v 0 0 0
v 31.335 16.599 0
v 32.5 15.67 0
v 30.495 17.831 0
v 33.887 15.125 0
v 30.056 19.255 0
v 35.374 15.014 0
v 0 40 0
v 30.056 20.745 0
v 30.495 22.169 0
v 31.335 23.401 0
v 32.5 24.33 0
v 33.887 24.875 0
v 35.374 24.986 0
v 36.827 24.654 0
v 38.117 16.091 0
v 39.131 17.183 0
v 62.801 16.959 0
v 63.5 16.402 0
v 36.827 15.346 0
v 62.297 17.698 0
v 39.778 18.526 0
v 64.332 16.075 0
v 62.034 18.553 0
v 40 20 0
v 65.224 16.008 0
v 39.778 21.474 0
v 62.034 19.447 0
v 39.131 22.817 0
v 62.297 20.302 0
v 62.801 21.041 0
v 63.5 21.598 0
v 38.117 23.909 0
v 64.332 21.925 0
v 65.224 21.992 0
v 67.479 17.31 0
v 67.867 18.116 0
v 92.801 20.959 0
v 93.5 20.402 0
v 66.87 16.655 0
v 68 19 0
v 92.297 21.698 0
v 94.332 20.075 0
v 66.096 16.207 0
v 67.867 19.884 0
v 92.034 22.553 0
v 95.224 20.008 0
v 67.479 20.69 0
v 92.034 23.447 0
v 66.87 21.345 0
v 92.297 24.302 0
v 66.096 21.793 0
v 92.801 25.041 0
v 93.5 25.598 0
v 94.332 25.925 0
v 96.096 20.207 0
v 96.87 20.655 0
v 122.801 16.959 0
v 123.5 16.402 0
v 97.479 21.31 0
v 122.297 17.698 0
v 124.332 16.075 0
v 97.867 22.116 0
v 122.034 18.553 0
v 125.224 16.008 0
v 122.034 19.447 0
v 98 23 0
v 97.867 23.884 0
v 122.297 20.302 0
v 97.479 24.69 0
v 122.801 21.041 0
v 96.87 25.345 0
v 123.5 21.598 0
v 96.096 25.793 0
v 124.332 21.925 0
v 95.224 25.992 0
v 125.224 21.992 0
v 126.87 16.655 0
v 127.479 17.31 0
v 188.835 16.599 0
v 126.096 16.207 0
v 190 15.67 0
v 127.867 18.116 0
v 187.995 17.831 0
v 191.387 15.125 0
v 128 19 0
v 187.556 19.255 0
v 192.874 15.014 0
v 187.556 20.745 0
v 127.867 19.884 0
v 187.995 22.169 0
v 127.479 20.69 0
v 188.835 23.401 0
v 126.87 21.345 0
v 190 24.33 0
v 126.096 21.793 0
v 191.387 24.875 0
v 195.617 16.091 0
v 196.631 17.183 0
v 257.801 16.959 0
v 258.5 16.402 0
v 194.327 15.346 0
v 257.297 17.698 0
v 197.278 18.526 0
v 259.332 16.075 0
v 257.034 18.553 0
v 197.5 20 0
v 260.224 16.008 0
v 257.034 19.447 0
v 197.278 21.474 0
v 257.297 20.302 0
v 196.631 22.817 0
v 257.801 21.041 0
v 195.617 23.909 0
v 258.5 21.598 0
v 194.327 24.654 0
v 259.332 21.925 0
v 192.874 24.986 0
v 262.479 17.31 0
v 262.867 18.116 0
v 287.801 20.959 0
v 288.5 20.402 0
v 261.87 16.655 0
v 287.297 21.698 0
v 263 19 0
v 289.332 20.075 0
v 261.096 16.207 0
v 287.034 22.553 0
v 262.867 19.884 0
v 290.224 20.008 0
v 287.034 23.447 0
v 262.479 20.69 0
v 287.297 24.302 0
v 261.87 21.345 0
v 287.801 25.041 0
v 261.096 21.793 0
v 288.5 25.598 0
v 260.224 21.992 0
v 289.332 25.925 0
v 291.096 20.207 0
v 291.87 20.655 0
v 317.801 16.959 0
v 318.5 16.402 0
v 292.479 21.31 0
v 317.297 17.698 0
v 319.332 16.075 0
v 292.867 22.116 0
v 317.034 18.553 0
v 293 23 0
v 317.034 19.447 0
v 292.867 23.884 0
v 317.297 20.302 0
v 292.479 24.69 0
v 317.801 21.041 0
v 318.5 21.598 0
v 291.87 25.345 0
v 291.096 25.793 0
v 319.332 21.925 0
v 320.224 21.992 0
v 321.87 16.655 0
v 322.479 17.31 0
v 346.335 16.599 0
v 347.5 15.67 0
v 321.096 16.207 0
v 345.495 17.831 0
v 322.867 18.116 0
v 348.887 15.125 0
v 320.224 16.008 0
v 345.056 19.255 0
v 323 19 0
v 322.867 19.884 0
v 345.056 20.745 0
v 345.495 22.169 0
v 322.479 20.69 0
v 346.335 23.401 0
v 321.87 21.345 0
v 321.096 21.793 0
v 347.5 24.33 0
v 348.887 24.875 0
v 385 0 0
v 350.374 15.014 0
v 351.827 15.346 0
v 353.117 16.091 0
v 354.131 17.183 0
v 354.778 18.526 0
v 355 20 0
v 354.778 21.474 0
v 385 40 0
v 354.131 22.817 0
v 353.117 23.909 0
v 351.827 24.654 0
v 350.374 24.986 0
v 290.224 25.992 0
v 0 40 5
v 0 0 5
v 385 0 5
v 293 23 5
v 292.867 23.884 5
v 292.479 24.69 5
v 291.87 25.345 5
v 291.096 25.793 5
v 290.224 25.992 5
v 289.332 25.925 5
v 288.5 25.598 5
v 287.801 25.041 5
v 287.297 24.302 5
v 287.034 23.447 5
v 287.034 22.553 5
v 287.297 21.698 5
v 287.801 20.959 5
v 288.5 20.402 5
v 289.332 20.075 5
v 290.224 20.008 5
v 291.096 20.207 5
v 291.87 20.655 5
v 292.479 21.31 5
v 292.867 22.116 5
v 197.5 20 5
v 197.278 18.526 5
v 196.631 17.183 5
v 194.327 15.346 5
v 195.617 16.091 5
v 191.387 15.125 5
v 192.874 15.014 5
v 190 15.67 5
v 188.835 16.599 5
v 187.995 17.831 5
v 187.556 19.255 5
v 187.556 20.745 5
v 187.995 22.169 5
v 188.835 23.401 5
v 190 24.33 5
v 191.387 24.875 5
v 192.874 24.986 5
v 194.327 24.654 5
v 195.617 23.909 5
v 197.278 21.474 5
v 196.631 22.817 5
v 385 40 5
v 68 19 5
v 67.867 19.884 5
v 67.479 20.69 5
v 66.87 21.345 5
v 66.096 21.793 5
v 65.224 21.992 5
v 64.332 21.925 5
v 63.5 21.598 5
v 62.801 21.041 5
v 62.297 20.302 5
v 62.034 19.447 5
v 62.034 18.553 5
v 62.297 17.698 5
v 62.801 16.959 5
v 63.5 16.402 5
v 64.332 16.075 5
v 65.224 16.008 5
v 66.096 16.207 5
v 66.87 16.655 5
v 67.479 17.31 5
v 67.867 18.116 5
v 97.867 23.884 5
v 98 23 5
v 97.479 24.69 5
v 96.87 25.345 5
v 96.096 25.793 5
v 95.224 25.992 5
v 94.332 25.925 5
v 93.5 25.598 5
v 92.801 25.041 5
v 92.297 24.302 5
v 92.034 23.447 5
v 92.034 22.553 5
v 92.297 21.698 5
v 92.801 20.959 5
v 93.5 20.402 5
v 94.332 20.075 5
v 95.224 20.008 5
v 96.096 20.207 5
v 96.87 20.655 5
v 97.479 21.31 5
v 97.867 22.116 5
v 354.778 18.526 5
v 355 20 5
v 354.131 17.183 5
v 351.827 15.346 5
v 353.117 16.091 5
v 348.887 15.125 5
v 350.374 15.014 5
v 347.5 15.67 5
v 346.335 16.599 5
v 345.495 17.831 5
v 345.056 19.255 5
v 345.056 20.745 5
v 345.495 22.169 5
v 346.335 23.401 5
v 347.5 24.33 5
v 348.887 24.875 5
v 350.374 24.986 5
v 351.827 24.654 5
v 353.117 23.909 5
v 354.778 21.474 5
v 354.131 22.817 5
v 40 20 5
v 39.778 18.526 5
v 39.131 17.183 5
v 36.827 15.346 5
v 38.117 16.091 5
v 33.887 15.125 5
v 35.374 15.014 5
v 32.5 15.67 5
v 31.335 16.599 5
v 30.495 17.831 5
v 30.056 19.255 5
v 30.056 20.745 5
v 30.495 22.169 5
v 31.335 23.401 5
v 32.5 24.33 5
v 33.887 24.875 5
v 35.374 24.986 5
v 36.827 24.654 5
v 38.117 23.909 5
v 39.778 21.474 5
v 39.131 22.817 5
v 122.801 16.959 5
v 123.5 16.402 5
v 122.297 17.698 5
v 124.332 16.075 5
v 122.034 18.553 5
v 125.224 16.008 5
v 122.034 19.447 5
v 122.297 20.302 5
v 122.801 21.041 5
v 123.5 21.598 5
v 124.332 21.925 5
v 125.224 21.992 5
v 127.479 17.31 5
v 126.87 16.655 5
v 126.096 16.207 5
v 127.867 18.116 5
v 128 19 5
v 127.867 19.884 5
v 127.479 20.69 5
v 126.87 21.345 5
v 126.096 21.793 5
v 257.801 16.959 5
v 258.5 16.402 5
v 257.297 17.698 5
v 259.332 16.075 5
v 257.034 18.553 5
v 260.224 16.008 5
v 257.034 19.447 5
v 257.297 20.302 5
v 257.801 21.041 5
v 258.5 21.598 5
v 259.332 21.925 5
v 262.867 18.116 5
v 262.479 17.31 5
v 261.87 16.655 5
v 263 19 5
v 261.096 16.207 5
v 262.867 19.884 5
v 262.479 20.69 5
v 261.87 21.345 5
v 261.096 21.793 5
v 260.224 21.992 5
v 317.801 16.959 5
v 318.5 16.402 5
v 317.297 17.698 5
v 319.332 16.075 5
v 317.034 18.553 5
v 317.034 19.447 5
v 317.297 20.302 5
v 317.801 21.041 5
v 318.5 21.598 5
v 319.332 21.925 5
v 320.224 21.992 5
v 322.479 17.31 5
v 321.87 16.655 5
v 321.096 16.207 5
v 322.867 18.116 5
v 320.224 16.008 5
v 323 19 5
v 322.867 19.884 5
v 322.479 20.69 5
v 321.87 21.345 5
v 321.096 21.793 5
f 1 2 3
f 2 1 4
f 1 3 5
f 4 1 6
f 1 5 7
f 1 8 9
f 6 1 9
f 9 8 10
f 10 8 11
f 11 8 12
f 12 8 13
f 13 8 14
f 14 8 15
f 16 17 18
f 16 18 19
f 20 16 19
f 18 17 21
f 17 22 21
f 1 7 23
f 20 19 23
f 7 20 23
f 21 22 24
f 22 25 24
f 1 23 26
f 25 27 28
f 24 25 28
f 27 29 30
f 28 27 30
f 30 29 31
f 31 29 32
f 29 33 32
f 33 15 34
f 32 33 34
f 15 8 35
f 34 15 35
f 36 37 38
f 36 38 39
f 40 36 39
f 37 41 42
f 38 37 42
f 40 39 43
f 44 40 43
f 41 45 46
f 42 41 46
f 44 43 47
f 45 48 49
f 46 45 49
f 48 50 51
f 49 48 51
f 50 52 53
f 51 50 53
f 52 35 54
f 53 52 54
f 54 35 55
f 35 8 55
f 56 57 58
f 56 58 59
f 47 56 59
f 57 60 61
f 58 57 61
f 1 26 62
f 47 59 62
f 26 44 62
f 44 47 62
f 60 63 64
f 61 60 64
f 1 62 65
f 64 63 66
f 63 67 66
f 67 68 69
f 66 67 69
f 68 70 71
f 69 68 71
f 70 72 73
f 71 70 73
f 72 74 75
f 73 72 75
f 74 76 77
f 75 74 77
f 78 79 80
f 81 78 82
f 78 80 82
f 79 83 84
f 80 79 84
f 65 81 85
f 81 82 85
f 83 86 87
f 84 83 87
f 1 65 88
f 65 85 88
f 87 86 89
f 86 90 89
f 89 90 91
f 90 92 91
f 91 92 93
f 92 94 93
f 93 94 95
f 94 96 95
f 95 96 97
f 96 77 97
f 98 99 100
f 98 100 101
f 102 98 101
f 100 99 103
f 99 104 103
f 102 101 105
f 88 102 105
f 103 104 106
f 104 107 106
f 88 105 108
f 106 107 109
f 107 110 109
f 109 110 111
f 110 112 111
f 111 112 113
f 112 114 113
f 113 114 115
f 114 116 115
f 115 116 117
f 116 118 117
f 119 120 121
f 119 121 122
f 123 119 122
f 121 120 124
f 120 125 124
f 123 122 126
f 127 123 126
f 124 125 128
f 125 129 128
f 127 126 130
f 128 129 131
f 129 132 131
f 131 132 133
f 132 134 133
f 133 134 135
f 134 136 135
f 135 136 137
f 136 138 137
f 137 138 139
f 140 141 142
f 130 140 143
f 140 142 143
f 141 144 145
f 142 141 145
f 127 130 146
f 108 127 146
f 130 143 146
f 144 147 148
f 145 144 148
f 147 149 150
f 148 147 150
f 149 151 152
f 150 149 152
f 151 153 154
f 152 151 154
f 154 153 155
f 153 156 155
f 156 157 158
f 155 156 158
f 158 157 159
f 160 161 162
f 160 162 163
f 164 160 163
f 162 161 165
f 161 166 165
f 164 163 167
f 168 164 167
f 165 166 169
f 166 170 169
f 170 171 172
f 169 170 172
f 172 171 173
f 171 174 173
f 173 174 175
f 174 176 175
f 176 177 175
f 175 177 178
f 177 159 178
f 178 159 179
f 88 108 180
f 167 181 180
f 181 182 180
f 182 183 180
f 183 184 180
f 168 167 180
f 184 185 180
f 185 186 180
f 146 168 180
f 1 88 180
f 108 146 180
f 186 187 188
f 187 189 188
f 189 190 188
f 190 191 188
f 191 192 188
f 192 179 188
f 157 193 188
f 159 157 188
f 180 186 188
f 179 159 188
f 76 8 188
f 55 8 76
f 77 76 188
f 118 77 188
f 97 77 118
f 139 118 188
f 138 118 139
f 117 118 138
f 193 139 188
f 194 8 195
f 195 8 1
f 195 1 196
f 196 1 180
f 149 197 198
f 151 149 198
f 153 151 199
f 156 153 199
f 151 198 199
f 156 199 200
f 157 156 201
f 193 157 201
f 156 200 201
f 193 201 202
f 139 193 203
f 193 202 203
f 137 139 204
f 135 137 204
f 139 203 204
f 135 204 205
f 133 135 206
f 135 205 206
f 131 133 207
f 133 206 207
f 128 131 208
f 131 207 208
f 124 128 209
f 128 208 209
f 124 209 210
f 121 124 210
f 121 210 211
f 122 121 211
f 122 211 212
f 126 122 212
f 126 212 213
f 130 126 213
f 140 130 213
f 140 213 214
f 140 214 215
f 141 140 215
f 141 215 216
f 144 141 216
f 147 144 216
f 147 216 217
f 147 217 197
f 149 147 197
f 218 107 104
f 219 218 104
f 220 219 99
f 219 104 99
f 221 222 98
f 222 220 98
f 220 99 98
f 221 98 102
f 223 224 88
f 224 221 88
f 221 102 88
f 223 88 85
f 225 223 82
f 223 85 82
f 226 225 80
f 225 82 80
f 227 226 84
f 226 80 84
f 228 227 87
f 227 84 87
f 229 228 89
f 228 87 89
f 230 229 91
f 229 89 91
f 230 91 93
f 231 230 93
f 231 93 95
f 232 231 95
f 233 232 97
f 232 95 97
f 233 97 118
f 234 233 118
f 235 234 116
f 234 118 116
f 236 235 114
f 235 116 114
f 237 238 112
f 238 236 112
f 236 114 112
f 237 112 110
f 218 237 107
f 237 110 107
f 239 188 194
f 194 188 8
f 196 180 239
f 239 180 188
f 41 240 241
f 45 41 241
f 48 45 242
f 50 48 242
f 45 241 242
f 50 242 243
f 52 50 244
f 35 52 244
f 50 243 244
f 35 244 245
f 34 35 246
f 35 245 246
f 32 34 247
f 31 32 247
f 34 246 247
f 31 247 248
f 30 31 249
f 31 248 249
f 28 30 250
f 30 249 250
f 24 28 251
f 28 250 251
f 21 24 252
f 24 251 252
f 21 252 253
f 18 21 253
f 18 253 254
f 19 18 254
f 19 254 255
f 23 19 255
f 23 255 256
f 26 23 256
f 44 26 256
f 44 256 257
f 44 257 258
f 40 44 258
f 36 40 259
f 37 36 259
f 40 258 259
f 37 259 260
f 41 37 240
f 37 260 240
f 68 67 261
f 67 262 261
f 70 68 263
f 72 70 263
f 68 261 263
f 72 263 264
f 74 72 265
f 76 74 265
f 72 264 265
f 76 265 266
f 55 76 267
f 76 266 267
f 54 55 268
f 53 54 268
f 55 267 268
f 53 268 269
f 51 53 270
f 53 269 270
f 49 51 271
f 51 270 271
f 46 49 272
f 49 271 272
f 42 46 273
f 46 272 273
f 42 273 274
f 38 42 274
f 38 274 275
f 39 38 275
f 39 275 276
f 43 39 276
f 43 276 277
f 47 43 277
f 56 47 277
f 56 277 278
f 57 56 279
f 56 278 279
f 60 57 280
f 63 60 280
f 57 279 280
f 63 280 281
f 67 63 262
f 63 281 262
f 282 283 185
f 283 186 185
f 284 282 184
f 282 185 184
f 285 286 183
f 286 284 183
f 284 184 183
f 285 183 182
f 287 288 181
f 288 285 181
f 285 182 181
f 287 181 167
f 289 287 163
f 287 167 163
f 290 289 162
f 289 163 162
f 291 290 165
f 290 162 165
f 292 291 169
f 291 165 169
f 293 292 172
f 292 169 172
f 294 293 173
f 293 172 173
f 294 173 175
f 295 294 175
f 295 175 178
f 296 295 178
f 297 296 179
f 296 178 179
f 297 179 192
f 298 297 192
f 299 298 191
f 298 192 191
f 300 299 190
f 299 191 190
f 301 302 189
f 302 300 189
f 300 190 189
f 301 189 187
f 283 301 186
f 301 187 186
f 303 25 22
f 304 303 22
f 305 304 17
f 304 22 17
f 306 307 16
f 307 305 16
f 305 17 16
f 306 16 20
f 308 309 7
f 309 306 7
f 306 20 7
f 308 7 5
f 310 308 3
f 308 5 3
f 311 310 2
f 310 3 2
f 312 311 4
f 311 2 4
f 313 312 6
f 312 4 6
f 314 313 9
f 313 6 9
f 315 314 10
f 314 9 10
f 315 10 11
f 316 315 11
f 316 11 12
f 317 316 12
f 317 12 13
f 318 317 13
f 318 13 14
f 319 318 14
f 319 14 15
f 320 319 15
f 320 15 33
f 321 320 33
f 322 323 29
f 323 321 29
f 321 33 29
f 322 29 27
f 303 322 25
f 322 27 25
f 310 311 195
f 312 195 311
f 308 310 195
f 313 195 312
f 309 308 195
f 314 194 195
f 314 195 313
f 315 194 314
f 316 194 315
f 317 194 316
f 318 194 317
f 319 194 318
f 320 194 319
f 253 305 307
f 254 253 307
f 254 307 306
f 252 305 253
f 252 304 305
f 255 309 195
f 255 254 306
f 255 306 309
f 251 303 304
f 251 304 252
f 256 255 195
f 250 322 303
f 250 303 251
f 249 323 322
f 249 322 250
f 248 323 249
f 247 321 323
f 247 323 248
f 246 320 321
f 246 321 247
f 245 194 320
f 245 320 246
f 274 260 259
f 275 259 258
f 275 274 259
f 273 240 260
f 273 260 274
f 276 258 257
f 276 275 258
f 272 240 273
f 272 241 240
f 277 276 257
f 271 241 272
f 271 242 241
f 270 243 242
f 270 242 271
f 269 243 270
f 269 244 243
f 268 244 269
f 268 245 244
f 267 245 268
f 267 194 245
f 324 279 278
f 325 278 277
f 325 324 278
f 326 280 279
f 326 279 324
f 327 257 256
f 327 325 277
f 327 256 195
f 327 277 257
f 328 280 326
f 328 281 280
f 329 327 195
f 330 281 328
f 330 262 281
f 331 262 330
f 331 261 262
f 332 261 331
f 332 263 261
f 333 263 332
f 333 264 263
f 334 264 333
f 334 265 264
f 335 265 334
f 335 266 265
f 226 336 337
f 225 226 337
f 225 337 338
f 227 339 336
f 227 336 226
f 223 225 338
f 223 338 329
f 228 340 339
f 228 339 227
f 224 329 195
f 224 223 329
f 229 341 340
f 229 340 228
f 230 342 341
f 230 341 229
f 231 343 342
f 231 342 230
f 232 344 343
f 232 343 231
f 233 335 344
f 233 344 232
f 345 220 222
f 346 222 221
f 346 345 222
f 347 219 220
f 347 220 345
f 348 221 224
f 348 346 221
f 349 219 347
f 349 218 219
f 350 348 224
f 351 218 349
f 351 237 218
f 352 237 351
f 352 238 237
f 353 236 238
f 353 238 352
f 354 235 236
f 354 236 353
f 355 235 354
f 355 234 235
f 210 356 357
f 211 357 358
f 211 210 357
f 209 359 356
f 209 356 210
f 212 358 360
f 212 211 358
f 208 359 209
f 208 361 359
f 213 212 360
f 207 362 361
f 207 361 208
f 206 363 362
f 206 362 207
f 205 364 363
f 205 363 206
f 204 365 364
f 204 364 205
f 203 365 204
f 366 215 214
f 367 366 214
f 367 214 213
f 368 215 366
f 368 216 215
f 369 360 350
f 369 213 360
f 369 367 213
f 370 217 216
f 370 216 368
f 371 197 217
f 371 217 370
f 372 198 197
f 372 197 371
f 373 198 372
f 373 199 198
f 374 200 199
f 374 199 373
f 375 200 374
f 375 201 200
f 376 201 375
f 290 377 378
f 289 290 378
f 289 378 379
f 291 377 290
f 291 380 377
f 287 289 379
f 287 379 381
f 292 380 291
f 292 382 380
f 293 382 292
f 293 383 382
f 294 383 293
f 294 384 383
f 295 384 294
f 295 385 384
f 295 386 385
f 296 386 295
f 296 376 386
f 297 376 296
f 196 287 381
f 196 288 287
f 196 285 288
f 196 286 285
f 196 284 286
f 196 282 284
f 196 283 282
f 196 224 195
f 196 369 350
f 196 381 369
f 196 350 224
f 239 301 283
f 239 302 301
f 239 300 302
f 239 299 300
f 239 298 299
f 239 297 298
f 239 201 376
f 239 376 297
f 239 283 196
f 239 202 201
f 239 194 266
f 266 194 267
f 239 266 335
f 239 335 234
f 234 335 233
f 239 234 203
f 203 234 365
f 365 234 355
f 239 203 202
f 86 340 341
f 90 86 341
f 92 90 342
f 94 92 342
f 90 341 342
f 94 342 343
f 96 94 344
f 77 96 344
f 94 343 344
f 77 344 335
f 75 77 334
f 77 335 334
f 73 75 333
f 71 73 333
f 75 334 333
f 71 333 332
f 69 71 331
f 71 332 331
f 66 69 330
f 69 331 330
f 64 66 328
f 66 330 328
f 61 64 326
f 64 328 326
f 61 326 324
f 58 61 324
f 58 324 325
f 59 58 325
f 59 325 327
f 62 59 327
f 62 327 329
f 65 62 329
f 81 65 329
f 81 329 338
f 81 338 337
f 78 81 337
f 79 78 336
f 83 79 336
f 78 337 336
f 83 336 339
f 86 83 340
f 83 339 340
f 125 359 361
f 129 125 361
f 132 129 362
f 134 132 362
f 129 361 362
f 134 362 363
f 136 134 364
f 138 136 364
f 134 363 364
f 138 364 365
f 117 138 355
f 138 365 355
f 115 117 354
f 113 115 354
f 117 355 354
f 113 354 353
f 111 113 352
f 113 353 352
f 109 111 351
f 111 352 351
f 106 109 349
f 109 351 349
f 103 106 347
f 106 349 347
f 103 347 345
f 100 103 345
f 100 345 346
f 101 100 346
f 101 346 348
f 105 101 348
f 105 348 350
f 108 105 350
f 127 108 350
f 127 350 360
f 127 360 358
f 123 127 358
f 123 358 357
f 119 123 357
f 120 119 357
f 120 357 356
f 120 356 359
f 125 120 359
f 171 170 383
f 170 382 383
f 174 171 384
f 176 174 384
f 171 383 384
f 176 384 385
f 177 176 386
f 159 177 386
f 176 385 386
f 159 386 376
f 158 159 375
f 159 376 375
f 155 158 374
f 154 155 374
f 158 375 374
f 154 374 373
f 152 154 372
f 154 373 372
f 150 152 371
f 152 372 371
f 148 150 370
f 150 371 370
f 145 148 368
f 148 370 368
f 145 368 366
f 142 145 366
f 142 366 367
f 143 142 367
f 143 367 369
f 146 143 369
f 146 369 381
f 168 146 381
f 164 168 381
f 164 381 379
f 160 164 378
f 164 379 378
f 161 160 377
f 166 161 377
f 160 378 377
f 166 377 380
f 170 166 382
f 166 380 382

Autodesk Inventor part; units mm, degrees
ref_plane "YZ Plane" through (0, 0, 0) normal (1, 0, 0) x (0, 1, 0)
ref_plane "XZ Plane" through (0, 0, 0) normal (0, 1, 0) x (-1, 0, 0)
ref_plane "XY Plane" through (0, 0, 0) normal (0, 0, 1) x (1, 0, 0)
sketch "Boceto1" plane through (0, 0, 0) normal (0, 0, 1) x (1, 0, 0)
  line L0 (0, 0) -> (385, 0)
  line L1 (385, 0) -> (385, 40)
  line L2 (385, 40) -> (0, 40)
  line L3 (0, 40) -> (0, 0)
  line L4 (0, 20) -> (385, 20) construction
  circle A0 centre (35, 20) radius 5
  circle A1 centre (192.5, 20) radius 5
  circle A2 centre (350, 20) radius 5
  dimension "d0" = 40
  dimension "d1" = 385
  dimension "d2" = 10
  dimension "d3" = 10
  dimension "d4" = 10
  dimension "d5" = 35
  dimension "d6" = 35
extrude "Extrusión1" add sketch "Boceto1" along normal blind 5
sketch "Boceto2" plane through (0, 0, 5) normal (0, 0, 1) x (1, 0, 0)
  circle A0 centre (65, 19) radius 3
  circle A1 centre (95, 23) radius 3
  circle A2 centre (125, 19) radius 3
  circle A3 centre (260, 19) radius 3
  circle A4 centre (290, 23) radius 3
  circle A5 centre (320, 19) radius 3
  line L0 (0, 40) -> (0, 0) projected
  line L1 (385, 0) -> (385, 40) projected
  line L2 (0, 0) -> (385, 0) projected
  dimension "d14" = 6
  dimension "d15" = 6
  dimension "d17" = 6
  dimension "d18" = 30
  dimension "d20" = 60
  dimension "d21" = 30
  dimension "d26" = 4
  dimension "d27" = 4
  dimension "d28" = 65
  dimension "d29" = 65
  dimension "d30" = 19
  dimension "d31" = 19
  dimension "d32" = 60
extrude "Extrusión2" cut sketch "Boceto2" against normal blind 10
properties part number "Sup.Acrilico" material "Acrílico, claro"
